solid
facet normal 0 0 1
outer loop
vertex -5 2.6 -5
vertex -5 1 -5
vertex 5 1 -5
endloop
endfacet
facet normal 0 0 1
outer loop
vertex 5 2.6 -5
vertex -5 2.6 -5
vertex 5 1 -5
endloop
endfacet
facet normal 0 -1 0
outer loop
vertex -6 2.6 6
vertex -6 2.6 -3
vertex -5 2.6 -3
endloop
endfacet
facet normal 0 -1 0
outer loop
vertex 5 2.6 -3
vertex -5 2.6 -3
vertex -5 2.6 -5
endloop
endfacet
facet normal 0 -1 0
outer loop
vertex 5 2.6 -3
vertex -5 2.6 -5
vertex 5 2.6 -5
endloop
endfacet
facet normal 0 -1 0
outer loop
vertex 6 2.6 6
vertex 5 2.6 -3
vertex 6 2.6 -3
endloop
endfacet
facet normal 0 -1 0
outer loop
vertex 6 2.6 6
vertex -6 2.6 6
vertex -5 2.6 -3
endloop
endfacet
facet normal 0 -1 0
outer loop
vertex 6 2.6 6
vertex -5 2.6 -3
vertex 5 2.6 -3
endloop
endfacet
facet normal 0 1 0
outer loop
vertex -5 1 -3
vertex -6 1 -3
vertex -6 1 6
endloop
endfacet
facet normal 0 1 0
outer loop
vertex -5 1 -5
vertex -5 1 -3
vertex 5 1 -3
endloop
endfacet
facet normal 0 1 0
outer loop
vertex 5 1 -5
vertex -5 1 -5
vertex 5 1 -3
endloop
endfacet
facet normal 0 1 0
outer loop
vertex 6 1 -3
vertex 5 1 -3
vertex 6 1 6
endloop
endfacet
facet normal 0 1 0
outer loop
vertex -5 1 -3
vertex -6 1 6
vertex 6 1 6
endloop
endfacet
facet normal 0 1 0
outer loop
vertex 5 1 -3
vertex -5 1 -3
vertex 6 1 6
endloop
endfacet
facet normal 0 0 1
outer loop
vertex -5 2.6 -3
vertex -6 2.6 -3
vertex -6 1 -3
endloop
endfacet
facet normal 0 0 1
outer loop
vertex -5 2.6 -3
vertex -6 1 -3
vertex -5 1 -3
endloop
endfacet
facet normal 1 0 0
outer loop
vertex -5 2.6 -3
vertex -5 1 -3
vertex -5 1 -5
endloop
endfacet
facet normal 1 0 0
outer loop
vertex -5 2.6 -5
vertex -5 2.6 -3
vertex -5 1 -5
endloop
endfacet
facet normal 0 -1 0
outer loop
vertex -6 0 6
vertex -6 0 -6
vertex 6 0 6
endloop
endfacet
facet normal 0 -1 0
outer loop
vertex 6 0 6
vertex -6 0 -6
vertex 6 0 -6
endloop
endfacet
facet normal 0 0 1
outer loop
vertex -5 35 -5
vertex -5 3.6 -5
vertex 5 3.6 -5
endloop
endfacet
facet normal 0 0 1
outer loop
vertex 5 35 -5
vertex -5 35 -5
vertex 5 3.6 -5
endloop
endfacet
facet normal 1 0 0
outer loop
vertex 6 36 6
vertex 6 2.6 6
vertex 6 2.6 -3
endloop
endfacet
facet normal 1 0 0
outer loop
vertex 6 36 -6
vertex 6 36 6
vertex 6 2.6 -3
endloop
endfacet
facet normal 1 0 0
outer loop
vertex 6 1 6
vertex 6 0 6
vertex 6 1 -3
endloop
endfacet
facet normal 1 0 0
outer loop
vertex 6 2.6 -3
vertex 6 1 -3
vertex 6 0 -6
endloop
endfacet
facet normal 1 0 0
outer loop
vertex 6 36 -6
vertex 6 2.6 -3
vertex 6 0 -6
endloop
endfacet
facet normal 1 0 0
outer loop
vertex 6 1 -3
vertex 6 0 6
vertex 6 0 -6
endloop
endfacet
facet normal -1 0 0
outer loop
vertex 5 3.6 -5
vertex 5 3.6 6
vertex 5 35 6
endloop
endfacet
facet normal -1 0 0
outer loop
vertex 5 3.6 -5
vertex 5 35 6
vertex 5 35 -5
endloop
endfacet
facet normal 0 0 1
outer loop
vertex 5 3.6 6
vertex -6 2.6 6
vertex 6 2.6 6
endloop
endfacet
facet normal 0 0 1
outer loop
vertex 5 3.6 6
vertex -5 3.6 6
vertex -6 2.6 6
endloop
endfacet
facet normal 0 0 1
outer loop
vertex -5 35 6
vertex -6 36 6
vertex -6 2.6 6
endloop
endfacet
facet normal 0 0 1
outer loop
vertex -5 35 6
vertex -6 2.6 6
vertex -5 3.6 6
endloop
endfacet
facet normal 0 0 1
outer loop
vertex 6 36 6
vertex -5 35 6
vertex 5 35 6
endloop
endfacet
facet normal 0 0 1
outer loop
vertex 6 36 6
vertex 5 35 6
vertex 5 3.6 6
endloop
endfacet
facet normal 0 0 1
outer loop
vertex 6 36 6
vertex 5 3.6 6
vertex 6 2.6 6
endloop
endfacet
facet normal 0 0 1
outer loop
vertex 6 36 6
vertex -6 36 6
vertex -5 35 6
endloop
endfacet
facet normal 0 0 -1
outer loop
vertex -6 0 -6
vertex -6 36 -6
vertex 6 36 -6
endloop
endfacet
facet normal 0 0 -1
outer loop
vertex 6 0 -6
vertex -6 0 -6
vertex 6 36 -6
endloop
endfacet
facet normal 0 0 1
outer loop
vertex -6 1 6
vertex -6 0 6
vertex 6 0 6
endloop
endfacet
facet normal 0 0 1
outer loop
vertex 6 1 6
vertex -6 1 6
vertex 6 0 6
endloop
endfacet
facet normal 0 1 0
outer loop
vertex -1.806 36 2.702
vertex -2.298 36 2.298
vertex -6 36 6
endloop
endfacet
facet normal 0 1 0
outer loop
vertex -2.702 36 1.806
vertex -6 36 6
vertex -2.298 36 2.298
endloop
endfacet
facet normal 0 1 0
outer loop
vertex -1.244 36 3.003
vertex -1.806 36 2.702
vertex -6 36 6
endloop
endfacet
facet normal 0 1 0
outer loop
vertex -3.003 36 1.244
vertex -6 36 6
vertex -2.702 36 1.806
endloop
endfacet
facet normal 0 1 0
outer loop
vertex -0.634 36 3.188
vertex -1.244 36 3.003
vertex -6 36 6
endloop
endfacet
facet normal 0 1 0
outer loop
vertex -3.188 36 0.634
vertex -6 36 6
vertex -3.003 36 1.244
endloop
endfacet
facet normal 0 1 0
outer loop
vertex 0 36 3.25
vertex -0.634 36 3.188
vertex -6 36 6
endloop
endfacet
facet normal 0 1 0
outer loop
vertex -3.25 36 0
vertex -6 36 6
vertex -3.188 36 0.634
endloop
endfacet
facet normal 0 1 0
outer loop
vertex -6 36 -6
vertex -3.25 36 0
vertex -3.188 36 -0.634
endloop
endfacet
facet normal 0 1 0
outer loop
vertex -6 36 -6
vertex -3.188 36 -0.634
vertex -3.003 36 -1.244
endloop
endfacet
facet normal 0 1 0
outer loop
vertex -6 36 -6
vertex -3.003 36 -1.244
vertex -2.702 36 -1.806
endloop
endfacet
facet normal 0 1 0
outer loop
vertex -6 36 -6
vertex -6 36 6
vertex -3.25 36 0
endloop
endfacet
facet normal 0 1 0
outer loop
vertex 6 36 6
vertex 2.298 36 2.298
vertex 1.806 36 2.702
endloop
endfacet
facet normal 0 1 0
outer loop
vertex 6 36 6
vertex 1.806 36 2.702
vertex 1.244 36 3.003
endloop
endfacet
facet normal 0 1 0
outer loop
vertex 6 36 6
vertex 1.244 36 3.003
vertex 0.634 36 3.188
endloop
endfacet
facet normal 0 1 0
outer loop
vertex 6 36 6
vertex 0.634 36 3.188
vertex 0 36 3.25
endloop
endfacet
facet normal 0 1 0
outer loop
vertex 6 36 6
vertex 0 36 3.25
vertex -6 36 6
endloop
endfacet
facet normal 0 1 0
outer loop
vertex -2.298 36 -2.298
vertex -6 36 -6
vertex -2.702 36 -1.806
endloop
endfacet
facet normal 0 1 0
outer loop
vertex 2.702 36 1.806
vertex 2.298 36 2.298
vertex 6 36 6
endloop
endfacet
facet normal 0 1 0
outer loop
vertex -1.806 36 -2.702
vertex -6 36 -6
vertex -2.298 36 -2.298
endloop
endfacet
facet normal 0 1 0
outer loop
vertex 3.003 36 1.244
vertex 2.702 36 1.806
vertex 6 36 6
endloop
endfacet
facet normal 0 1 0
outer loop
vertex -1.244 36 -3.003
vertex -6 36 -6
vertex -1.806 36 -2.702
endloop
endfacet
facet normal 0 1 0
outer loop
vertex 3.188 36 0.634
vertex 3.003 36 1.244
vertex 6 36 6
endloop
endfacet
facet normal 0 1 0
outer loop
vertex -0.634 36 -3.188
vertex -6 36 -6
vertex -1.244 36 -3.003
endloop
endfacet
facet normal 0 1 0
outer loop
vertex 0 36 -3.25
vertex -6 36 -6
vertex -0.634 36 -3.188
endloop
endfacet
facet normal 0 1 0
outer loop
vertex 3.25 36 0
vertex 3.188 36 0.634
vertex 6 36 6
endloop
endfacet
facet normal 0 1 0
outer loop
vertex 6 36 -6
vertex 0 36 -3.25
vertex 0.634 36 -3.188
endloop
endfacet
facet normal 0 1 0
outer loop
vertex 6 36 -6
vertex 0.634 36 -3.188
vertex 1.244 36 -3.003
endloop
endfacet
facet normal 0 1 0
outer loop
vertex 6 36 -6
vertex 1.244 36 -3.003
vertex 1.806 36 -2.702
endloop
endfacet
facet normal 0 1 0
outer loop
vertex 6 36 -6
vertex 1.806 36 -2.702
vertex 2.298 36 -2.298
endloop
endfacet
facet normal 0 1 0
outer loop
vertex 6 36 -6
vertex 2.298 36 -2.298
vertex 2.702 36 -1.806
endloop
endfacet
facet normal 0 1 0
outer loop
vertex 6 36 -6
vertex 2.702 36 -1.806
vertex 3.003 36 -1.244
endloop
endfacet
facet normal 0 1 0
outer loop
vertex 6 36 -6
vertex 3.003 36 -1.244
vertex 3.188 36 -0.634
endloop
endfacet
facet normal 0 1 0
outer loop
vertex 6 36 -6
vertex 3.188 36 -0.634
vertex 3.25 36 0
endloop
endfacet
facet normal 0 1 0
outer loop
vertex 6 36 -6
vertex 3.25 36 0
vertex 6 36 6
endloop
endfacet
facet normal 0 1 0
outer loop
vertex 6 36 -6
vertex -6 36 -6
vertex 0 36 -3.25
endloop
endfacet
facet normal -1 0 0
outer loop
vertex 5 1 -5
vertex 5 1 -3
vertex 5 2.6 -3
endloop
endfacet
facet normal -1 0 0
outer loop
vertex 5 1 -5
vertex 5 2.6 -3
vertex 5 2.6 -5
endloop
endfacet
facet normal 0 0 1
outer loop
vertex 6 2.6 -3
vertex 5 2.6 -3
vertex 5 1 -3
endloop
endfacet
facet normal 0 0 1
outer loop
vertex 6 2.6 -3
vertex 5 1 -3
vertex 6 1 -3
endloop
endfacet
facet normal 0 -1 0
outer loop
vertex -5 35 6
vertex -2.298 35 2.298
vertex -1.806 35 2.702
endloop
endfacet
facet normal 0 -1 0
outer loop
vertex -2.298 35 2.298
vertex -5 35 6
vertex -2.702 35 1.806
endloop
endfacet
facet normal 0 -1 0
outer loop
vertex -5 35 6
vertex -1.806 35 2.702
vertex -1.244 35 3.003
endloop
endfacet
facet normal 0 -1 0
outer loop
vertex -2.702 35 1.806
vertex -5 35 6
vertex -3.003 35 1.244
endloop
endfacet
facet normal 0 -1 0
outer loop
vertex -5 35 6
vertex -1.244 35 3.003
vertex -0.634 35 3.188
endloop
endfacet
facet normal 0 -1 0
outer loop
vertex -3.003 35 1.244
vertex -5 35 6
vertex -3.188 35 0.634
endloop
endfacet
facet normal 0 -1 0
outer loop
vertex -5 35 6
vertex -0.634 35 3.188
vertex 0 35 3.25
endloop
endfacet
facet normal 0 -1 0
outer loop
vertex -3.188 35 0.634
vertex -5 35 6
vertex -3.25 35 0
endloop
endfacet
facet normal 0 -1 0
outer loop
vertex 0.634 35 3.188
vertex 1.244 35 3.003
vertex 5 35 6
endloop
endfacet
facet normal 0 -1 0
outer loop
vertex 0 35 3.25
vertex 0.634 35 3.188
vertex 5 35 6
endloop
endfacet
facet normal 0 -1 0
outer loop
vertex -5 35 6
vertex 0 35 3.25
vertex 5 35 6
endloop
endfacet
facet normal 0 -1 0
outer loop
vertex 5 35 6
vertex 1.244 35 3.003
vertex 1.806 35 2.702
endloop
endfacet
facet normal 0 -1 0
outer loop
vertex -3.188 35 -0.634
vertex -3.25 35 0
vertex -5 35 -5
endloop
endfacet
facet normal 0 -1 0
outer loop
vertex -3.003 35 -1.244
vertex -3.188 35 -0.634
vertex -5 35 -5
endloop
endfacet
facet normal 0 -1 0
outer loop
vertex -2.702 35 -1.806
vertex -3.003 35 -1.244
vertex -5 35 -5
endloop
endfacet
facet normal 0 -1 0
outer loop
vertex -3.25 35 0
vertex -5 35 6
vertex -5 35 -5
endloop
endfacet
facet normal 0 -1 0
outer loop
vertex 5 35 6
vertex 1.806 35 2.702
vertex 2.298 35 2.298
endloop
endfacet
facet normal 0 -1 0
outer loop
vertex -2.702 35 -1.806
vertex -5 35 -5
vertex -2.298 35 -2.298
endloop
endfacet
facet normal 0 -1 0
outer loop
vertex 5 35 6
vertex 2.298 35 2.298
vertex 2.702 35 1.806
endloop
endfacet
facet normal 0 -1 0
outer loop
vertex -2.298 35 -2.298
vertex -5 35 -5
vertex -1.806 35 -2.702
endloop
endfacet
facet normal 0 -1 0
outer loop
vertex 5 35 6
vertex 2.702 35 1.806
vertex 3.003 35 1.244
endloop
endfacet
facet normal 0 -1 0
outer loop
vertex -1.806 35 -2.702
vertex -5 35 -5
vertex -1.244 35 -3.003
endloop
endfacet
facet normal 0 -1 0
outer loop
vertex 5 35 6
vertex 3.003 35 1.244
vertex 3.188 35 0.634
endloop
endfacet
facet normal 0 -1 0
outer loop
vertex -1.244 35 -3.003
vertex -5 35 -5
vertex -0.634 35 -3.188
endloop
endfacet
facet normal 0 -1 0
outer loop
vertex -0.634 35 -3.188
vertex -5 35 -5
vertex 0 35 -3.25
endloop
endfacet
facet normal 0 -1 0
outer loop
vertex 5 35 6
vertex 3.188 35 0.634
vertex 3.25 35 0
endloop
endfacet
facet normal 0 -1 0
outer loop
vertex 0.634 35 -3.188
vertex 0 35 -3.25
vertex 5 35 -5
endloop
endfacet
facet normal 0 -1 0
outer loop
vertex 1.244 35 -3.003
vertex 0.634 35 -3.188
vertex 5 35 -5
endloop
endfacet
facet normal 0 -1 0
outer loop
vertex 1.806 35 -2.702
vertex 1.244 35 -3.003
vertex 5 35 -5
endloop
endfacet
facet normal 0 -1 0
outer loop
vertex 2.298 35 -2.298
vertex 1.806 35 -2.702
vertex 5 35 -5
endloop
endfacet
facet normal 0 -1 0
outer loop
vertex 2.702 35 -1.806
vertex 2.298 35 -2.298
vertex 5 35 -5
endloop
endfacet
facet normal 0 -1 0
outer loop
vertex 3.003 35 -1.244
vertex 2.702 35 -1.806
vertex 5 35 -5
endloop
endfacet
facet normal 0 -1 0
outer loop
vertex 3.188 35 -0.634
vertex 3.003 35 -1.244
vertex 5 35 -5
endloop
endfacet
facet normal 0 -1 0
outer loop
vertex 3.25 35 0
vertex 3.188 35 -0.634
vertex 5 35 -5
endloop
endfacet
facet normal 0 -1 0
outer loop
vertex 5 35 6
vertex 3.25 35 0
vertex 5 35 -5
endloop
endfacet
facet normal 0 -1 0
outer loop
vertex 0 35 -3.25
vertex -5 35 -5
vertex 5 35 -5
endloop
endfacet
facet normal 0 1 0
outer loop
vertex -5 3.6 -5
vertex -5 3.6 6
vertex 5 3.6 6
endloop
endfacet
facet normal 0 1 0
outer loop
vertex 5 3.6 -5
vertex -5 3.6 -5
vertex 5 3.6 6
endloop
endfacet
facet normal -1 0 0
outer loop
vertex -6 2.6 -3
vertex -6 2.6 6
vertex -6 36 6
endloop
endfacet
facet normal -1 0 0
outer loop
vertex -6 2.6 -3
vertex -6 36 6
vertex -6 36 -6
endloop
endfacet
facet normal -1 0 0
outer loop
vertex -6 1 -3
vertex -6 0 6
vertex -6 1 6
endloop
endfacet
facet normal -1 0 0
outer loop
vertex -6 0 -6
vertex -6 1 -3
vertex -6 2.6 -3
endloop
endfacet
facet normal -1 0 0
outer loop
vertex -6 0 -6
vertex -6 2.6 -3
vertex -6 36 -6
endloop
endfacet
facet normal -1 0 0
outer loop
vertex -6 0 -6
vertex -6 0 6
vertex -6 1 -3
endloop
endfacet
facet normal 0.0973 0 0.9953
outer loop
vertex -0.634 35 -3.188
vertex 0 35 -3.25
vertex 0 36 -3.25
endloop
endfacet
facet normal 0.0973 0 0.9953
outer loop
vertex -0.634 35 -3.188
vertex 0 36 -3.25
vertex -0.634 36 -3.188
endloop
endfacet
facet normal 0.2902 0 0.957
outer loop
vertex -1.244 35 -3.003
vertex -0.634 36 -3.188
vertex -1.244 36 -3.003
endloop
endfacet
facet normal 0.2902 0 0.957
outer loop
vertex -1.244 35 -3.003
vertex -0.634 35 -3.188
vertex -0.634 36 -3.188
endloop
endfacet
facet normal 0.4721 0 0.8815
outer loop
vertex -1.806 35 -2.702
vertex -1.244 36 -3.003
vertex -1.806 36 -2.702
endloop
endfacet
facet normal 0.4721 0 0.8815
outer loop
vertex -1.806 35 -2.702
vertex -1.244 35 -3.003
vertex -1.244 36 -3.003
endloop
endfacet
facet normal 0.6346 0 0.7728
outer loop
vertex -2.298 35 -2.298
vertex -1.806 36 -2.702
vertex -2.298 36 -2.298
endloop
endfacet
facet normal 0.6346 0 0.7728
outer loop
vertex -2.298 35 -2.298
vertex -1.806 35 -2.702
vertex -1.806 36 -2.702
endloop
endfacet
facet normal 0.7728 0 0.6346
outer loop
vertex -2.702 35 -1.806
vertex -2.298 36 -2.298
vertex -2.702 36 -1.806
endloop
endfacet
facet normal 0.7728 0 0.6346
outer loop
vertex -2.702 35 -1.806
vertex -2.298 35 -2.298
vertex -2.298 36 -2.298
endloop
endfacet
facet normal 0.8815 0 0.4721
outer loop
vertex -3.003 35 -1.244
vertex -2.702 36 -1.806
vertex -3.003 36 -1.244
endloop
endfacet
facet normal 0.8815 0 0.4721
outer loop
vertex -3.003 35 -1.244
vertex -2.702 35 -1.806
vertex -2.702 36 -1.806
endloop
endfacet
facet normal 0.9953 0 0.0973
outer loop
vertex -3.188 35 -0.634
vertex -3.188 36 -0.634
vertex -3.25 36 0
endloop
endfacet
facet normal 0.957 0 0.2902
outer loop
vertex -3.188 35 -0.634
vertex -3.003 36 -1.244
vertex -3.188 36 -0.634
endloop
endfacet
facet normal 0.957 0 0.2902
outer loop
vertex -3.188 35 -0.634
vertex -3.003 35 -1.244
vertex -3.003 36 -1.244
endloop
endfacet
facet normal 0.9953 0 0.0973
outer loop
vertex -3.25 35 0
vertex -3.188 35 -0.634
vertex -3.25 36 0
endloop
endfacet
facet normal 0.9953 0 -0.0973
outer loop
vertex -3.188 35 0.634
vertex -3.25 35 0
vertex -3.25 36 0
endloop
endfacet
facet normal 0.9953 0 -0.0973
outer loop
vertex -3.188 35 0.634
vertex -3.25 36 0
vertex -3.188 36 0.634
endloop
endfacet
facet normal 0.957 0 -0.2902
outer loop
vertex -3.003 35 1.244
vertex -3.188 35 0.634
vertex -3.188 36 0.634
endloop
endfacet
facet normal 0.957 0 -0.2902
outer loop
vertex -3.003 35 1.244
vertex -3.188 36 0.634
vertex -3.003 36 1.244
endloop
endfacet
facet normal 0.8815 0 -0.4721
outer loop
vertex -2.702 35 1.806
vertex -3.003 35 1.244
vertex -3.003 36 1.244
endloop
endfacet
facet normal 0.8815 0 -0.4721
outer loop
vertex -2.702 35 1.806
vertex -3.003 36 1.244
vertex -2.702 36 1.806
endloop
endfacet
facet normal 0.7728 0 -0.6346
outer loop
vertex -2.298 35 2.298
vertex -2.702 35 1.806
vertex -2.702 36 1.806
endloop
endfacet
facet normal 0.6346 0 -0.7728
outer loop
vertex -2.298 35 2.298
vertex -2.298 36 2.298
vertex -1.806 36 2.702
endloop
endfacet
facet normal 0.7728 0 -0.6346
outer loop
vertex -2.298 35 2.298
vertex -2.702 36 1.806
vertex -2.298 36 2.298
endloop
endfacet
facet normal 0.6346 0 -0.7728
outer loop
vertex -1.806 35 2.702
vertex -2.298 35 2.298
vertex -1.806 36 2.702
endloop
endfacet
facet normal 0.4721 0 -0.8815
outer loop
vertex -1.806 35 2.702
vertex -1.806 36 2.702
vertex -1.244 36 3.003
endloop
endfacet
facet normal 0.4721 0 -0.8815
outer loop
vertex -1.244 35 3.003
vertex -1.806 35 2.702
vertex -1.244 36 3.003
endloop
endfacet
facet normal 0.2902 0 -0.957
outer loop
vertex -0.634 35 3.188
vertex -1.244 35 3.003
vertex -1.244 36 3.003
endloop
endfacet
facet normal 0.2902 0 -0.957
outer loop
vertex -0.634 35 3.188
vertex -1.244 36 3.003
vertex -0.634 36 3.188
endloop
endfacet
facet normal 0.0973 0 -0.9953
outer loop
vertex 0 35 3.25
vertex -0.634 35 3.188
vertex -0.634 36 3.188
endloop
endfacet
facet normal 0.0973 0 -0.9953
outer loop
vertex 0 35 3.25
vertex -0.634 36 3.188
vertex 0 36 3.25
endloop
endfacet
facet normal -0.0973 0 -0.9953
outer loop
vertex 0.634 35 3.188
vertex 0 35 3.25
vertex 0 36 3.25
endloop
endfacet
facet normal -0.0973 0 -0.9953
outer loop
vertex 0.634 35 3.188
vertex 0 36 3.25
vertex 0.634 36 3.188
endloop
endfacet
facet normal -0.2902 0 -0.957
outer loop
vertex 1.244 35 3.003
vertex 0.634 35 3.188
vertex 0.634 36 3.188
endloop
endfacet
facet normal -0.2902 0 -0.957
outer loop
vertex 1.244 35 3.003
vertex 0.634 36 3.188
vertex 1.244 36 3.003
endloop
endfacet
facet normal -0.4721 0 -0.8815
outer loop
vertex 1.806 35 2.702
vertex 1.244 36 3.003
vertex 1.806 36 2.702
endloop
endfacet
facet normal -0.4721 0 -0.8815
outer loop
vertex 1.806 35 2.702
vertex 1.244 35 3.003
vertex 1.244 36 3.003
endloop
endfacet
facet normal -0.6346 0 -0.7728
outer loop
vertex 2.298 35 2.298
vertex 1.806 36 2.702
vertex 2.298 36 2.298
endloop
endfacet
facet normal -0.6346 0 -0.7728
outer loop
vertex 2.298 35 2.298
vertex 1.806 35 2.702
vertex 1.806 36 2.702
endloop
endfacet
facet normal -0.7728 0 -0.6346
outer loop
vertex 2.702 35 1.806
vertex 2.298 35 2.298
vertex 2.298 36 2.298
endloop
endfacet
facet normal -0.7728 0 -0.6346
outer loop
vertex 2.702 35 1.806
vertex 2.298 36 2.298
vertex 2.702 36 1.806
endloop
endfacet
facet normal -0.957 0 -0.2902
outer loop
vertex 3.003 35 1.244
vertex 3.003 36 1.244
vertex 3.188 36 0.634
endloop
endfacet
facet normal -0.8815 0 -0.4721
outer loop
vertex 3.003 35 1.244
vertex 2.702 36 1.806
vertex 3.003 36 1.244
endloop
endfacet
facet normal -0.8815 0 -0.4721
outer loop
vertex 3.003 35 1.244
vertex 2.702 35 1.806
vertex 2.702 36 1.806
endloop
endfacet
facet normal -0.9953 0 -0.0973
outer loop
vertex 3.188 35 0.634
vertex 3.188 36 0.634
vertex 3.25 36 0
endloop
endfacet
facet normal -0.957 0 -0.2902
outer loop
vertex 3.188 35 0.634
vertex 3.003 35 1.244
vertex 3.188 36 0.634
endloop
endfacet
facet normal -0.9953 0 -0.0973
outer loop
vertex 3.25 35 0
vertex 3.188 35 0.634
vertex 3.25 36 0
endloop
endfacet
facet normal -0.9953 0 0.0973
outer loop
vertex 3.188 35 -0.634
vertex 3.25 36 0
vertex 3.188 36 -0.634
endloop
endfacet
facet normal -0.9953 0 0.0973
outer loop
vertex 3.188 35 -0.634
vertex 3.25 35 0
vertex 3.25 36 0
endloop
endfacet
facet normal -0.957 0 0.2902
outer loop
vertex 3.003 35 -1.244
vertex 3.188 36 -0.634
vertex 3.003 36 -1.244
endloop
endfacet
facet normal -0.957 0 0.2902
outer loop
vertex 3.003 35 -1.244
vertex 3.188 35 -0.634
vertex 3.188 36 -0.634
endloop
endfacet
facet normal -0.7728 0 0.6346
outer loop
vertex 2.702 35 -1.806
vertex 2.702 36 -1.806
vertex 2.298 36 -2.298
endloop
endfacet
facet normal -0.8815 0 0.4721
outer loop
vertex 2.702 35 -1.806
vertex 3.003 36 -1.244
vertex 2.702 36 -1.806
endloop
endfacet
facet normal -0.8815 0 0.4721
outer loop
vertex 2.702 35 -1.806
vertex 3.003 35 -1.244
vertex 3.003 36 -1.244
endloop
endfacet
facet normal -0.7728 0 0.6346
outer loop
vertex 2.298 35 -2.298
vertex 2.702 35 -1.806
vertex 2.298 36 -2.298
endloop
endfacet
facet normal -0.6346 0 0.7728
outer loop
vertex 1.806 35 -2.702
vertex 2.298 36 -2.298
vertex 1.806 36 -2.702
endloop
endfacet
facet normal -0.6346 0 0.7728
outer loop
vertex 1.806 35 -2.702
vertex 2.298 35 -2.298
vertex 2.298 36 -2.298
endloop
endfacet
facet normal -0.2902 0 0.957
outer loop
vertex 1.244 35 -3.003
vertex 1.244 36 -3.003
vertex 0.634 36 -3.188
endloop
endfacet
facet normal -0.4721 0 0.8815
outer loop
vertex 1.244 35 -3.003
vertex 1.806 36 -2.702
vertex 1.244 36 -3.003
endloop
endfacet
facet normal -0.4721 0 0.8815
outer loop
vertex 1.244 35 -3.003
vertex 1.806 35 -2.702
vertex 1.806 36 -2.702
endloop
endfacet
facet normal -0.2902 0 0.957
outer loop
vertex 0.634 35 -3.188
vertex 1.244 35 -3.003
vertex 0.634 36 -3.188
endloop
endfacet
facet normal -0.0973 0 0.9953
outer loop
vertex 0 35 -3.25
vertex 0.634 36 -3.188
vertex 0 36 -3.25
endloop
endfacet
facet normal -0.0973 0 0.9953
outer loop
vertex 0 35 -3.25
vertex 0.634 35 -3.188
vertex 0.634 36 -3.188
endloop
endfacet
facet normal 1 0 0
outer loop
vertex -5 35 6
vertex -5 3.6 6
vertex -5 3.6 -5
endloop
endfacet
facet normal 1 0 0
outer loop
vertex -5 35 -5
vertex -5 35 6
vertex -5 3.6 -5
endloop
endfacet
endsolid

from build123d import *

# Parameters (mm, degrees)
CROQUIS1_W                 = 12
CROQUIS1_H                 = 12
SALIENTE_EXTRUIR1_DEPTH    = 36
VACIADO1_T                 = -1
CORTAR_EXTRUIR1_DEPTH      = 37.986484018
CORTAR_EXTRUIR1_DEPTH_BACK = 3
CROQUIS2_R                 = 3.25
CROQUIS3_W                 = 13.652855543
CROQUIS3_H                 = 1.6
CORTAR_EXTRUIR2_DEPTH      = 9
CROQUIS4_W                 = 10
CROQUIS4_H                 = 1
SALIENTE_EXTRUIR2_DEPTH    = 11


with BuildPart() as part:
    # Croquis1 → Saliente-Extruir1 (new body)
    with BuildSketch(Plane(origin=(0, 0, 0), x_dir=(1, 0, 0), z_dir=(0, 1, 0))):
        Rectangle(CROQUIS1_W, CROQUIS1_H)
    extrude(amount=SALIENTE_EXTRUIR1_DEPTH)

    # Vaciado1
    vaciado1_openings = [part.faces().sort_by_distance(p)[0] for p in [
        (0, 18, 6),
    ]]
    offset(amount=VACIADO1_T, openings=vaciado1_openings, kind=Kind.INTERSECTION)

    # Croquis2 → Cortar-Extruir1 (cut, two sides: drawn at the far end of the back side and taken through both)
    with BuildSketch(Plane(origin=(0, 36, 0), x_dir=(1, 0, 0), z_dir=(0, 1, 0)).offset(-CORTAR_EXTRUIR1_DEPTH_BACK)):
        with Locations(Location((0, 0, 0), (0, 0, 90))):
            Circle(CROQUIS2_R)
    extrude(amount=CORTAR_EXTRUIR1_DEPTH + CORTAR_EXTRUIR1_DEPTH_BACK, mode=Mode.SUBTRACT)

    # Croquis3 → Cortar-Extruir2 (cut)
    with BuildSketch(Plane.XY.offset(6)):
        with Locations((0.0537514, 1.8)):
            Rectangle(CROQUIS3_W, CROQUIS3_H)
    extrude(amount=-CORTAR_EXTRUIR2_DEPTH, mode=Mode.SUBTRACT)

    # Croquis4 → Saliente-Extruir2 (add)
    with BuildSketch(Plane.XY.offset(6)):
        with Locations((0, 3.1)):
            Rectangle(CROQUIS4_W, CROQUIS4_H)
    extrude(amount=-SALIENTE_EXTRUIR2_DEPTH)


solid = part.part
